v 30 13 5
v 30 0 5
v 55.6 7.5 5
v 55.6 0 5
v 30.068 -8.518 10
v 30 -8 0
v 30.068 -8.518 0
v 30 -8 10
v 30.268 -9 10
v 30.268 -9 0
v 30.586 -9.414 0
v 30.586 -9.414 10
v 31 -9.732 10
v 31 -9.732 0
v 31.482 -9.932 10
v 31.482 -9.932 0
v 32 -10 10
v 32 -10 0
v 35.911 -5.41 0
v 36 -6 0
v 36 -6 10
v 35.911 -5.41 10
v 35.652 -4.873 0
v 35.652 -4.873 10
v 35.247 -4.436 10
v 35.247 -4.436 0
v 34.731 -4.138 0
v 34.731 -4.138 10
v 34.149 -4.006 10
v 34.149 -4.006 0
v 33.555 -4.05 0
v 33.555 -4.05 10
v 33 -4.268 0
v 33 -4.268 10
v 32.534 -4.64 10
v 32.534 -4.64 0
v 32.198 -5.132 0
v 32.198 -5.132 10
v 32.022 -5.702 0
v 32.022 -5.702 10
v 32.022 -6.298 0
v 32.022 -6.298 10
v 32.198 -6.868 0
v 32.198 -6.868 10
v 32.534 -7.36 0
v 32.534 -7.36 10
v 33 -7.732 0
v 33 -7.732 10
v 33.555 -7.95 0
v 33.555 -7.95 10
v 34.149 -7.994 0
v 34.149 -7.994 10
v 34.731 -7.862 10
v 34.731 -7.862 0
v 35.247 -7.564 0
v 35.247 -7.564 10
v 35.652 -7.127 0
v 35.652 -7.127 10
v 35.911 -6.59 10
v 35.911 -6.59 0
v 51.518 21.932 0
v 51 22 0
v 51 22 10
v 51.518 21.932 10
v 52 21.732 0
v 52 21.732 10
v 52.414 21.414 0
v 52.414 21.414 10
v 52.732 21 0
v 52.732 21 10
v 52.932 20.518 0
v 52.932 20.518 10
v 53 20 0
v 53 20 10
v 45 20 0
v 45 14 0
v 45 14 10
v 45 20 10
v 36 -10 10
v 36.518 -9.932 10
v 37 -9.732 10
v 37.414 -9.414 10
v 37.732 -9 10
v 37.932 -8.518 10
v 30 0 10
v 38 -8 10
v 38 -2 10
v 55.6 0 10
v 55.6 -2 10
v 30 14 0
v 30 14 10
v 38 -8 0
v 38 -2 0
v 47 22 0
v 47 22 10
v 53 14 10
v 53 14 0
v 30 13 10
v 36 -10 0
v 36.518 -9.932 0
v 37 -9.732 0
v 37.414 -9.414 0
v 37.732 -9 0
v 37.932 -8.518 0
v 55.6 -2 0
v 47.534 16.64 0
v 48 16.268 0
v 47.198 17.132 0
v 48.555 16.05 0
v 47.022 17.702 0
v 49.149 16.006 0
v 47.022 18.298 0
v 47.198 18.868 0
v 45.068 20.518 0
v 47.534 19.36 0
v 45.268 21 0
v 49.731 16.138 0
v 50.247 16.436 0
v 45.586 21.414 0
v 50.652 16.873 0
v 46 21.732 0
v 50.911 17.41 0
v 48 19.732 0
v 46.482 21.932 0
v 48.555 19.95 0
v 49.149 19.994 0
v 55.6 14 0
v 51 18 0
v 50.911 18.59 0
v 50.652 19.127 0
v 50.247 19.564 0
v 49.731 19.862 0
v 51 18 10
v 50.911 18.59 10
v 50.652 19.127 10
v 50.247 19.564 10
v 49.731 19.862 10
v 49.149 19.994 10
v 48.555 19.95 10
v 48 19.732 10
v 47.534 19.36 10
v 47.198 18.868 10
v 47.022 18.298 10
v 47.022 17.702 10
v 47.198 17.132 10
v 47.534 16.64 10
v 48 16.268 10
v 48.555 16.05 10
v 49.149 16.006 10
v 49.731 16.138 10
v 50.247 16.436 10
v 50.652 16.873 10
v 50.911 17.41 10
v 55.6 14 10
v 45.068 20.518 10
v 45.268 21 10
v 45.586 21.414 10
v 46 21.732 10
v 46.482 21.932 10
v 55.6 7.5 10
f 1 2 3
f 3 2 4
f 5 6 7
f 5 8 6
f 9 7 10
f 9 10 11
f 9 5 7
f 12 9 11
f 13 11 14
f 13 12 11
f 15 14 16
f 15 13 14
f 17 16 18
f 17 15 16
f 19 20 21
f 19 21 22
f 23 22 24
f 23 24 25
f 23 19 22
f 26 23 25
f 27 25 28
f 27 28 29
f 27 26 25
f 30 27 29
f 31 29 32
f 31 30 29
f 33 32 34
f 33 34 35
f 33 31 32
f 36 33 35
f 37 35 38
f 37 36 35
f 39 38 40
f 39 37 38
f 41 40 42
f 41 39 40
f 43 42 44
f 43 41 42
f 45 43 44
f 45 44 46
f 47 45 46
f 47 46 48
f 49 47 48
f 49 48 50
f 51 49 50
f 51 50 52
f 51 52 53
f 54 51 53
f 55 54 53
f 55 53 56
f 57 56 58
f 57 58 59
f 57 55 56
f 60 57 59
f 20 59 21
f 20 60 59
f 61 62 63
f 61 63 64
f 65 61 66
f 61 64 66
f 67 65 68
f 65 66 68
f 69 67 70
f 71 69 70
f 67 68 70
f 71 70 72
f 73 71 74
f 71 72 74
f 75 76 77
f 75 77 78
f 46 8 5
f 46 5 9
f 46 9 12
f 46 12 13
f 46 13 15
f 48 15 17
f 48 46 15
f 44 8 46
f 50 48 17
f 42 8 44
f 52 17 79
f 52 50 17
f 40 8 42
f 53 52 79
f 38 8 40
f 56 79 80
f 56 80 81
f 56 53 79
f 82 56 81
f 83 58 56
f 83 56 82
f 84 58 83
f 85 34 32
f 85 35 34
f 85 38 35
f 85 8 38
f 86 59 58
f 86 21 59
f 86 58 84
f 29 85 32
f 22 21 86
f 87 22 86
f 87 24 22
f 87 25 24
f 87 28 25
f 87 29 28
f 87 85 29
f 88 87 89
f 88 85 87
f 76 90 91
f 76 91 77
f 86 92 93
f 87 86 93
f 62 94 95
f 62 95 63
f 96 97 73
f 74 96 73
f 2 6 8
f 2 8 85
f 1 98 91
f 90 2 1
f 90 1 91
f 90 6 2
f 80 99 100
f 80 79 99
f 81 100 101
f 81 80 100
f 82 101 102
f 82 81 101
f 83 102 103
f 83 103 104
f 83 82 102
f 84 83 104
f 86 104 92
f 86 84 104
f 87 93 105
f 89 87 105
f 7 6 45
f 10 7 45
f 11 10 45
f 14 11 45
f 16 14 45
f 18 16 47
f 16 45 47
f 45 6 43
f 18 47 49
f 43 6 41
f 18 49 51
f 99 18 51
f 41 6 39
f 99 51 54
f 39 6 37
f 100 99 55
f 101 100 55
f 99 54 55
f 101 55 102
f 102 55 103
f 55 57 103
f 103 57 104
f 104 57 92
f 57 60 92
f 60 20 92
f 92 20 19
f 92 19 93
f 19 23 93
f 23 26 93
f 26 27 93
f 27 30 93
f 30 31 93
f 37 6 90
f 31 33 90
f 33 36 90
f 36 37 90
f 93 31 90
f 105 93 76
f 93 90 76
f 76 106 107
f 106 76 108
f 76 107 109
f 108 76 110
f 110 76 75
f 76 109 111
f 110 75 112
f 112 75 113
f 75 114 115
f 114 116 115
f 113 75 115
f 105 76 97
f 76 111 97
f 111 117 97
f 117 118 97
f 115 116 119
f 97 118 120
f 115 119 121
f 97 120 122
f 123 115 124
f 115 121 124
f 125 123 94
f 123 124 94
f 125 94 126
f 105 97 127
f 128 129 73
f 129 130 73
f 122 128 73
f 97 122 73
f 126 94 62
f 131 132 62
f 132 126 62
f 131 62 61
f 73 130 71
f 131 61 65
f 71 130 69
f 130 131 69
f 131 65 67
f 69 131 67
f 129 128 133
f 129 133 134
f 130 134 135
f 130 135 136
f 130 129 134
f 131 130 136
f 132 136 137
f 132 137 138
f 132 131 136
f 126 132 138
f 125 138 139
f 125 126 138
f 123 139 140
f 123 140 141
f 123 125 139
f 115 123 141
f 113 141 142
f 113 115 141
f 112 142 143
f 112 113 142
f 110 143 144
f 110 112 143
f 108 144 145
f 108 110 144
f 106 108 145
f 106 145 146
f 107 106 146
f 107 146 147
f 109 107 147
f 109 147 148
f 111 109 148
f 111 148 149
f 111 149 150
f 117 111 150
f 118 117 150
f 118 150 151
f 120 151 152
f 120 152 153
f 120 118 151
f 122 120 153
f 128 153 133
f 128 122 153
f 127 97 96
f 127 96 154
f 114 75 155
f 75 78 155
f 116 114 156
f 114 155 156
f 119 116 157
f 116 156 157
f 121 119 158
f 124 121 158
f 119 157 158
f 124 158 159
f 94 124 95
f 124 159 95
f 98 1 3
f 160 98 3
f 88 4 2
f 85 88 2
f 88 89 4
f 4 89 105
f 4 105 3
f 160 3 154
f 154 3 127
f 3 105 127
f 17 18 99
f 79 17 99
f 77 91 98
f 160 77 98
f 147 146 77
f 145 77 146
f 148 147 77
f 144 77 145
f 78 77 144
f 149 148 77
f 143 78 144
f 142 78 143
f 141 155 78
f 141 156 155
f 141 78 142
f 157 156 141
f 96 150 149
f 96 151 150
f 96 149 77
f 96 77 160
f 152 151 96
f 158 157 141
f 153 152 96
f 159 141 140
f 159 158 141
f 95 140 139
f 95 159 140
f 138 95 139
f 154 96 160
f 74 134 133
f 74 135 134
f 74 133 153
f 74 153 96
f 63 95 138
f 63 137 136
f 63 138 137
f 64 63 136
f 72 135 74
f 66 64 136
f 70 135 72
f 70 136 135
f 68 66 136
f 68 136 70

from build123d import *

# Parameters (mm, degrees)
CYLINDER004_R     = 2
CYLINDER004_DEPTH = 10
BOX003_W          = 8
BOX003_H          = 8
BOX003_DEPTH      = 10
FILLET_R          = 2
CYLINDER005_R     = 2
CYLINDER005_DEPTH = 10
BOX004_W          = 8
BOX004_H          = 8
BOX004_DEPTH      = 10
FILLET001_R       = 2
PAD001_DEPTH      = 5
BOX001_W          = 25.6
BOX001_H          = 16
BOX001_DEPTH      = 10


with BuildPart() as cylinder004:
    # Cylinder004 → Cylinder004 (new body)
    with BuildSketch(Plane(origin=(4, 4, 0), x_dir=(1, 0, 0), z_dir=(0, 0, 1))):
        Circle(CYLINDER004_R)
    extrude(amount=CYLINDER004_DEPTH)


with BuildPart() as fillet_body:
    # Box003 → Box003 (new body)
    with BuildSketch(Plane.XY):
        with Locations((4, 4)):
            Rectangle(BOX003_W, BOX003_H)
    extrude(amount=BOX003_DEPTH)

    # Cut004: cut Cylinder004
    add(cylinder004.part, mode=Mode.SUBTRACT)


with BuildPart() as fillet_body_1:
    # Cut004 placement: moved
    add(fillet_body.part.moved(Location((30, -10, 0))))

    # Fillet
    fillet_edges = [fillet_body_1.edges().sort_by_distance(p)[0] for p in [
        (30, -10, 5),
        (38, -10, 5),
    ]]
    fillet(fillet_edges, radius=FILLET_R)


with BuildPart() as cylinder005:
    # Cylinder005 → Cylinder005 (new body)
    with BuildSketch(Plane(origin=(4, 4, 0), x_dir=(1, 0, 0), z_dir=(0, 0, 1))):
        Circle(CYLINDER005_R)
    extrude(amount=CYLINDER005_DEPTH)


with BuildPart() as fillet001:
    # Box004 → Box004 (new body)
    with BuildSketch(Plane.XY):
        with Locations((4, 4)):
            Rectangle(BOX004_W, BOX004_H)
    extrude(amount=BOX004_DEPTH)

    # Cut005: cut Cylinder005
    add(cylinder005.part, mode=Mode.SUBTRACT)


with BuildPart() as fillet001_1:
    # Cut005 placement: moved
    add(fillet001.part.moved(Location((45, 14, 0))))

    # Fillet001
    fillet001_edges = [fillet001_1.edges().sort_by_distance(p)[0] for p in [
        (45, 22, 5),
        (53, 22, 5),
    ]]
    fillet(fillet001_edges, radius=FILLET001_R)


with BuildPart() as f_200mmbody:
    # Sketch001 → Pad001 (new body)
    with BuildSketch(Plane(origin=(0, 0, 0), x_dir=(-1, 0, 0), z_dir=(0, 0, 1))):
        Polygon((-30, 0), (-30, -13), (-55.6, -7.5), (-55.6, 0), align=None)
    extrude(amount=PAD001_DEPTH)


with BuildPart() as f_200mmbody_1:
    # Body001 placement: moved
    add(f_200mmbody.part.moved(Location((0, 0, 5))))


with BuildPart() as f_200mm:
    # Box001 → Box001 (new body)
    with BuildSketch(Plane(origin=(30, -2, 0), x_dir=(1, 0, 0), z_dir=(0, 0, 1))):
        with Locations((12.8, 8)):
            Rectangle(BOX001_W, BOX001_H)
    extrude(amount=BOX001_DEPTH)

    # Cut001: cut 200mmBody
    add(f_200mmbody_1.part, mode=Mode.SUBTRACT)

    # Fusion: union Fillet body, Fillet001
    add(fillet_body_1.part)
    add(fillet001_1.part)


solid = f_200mm.part
